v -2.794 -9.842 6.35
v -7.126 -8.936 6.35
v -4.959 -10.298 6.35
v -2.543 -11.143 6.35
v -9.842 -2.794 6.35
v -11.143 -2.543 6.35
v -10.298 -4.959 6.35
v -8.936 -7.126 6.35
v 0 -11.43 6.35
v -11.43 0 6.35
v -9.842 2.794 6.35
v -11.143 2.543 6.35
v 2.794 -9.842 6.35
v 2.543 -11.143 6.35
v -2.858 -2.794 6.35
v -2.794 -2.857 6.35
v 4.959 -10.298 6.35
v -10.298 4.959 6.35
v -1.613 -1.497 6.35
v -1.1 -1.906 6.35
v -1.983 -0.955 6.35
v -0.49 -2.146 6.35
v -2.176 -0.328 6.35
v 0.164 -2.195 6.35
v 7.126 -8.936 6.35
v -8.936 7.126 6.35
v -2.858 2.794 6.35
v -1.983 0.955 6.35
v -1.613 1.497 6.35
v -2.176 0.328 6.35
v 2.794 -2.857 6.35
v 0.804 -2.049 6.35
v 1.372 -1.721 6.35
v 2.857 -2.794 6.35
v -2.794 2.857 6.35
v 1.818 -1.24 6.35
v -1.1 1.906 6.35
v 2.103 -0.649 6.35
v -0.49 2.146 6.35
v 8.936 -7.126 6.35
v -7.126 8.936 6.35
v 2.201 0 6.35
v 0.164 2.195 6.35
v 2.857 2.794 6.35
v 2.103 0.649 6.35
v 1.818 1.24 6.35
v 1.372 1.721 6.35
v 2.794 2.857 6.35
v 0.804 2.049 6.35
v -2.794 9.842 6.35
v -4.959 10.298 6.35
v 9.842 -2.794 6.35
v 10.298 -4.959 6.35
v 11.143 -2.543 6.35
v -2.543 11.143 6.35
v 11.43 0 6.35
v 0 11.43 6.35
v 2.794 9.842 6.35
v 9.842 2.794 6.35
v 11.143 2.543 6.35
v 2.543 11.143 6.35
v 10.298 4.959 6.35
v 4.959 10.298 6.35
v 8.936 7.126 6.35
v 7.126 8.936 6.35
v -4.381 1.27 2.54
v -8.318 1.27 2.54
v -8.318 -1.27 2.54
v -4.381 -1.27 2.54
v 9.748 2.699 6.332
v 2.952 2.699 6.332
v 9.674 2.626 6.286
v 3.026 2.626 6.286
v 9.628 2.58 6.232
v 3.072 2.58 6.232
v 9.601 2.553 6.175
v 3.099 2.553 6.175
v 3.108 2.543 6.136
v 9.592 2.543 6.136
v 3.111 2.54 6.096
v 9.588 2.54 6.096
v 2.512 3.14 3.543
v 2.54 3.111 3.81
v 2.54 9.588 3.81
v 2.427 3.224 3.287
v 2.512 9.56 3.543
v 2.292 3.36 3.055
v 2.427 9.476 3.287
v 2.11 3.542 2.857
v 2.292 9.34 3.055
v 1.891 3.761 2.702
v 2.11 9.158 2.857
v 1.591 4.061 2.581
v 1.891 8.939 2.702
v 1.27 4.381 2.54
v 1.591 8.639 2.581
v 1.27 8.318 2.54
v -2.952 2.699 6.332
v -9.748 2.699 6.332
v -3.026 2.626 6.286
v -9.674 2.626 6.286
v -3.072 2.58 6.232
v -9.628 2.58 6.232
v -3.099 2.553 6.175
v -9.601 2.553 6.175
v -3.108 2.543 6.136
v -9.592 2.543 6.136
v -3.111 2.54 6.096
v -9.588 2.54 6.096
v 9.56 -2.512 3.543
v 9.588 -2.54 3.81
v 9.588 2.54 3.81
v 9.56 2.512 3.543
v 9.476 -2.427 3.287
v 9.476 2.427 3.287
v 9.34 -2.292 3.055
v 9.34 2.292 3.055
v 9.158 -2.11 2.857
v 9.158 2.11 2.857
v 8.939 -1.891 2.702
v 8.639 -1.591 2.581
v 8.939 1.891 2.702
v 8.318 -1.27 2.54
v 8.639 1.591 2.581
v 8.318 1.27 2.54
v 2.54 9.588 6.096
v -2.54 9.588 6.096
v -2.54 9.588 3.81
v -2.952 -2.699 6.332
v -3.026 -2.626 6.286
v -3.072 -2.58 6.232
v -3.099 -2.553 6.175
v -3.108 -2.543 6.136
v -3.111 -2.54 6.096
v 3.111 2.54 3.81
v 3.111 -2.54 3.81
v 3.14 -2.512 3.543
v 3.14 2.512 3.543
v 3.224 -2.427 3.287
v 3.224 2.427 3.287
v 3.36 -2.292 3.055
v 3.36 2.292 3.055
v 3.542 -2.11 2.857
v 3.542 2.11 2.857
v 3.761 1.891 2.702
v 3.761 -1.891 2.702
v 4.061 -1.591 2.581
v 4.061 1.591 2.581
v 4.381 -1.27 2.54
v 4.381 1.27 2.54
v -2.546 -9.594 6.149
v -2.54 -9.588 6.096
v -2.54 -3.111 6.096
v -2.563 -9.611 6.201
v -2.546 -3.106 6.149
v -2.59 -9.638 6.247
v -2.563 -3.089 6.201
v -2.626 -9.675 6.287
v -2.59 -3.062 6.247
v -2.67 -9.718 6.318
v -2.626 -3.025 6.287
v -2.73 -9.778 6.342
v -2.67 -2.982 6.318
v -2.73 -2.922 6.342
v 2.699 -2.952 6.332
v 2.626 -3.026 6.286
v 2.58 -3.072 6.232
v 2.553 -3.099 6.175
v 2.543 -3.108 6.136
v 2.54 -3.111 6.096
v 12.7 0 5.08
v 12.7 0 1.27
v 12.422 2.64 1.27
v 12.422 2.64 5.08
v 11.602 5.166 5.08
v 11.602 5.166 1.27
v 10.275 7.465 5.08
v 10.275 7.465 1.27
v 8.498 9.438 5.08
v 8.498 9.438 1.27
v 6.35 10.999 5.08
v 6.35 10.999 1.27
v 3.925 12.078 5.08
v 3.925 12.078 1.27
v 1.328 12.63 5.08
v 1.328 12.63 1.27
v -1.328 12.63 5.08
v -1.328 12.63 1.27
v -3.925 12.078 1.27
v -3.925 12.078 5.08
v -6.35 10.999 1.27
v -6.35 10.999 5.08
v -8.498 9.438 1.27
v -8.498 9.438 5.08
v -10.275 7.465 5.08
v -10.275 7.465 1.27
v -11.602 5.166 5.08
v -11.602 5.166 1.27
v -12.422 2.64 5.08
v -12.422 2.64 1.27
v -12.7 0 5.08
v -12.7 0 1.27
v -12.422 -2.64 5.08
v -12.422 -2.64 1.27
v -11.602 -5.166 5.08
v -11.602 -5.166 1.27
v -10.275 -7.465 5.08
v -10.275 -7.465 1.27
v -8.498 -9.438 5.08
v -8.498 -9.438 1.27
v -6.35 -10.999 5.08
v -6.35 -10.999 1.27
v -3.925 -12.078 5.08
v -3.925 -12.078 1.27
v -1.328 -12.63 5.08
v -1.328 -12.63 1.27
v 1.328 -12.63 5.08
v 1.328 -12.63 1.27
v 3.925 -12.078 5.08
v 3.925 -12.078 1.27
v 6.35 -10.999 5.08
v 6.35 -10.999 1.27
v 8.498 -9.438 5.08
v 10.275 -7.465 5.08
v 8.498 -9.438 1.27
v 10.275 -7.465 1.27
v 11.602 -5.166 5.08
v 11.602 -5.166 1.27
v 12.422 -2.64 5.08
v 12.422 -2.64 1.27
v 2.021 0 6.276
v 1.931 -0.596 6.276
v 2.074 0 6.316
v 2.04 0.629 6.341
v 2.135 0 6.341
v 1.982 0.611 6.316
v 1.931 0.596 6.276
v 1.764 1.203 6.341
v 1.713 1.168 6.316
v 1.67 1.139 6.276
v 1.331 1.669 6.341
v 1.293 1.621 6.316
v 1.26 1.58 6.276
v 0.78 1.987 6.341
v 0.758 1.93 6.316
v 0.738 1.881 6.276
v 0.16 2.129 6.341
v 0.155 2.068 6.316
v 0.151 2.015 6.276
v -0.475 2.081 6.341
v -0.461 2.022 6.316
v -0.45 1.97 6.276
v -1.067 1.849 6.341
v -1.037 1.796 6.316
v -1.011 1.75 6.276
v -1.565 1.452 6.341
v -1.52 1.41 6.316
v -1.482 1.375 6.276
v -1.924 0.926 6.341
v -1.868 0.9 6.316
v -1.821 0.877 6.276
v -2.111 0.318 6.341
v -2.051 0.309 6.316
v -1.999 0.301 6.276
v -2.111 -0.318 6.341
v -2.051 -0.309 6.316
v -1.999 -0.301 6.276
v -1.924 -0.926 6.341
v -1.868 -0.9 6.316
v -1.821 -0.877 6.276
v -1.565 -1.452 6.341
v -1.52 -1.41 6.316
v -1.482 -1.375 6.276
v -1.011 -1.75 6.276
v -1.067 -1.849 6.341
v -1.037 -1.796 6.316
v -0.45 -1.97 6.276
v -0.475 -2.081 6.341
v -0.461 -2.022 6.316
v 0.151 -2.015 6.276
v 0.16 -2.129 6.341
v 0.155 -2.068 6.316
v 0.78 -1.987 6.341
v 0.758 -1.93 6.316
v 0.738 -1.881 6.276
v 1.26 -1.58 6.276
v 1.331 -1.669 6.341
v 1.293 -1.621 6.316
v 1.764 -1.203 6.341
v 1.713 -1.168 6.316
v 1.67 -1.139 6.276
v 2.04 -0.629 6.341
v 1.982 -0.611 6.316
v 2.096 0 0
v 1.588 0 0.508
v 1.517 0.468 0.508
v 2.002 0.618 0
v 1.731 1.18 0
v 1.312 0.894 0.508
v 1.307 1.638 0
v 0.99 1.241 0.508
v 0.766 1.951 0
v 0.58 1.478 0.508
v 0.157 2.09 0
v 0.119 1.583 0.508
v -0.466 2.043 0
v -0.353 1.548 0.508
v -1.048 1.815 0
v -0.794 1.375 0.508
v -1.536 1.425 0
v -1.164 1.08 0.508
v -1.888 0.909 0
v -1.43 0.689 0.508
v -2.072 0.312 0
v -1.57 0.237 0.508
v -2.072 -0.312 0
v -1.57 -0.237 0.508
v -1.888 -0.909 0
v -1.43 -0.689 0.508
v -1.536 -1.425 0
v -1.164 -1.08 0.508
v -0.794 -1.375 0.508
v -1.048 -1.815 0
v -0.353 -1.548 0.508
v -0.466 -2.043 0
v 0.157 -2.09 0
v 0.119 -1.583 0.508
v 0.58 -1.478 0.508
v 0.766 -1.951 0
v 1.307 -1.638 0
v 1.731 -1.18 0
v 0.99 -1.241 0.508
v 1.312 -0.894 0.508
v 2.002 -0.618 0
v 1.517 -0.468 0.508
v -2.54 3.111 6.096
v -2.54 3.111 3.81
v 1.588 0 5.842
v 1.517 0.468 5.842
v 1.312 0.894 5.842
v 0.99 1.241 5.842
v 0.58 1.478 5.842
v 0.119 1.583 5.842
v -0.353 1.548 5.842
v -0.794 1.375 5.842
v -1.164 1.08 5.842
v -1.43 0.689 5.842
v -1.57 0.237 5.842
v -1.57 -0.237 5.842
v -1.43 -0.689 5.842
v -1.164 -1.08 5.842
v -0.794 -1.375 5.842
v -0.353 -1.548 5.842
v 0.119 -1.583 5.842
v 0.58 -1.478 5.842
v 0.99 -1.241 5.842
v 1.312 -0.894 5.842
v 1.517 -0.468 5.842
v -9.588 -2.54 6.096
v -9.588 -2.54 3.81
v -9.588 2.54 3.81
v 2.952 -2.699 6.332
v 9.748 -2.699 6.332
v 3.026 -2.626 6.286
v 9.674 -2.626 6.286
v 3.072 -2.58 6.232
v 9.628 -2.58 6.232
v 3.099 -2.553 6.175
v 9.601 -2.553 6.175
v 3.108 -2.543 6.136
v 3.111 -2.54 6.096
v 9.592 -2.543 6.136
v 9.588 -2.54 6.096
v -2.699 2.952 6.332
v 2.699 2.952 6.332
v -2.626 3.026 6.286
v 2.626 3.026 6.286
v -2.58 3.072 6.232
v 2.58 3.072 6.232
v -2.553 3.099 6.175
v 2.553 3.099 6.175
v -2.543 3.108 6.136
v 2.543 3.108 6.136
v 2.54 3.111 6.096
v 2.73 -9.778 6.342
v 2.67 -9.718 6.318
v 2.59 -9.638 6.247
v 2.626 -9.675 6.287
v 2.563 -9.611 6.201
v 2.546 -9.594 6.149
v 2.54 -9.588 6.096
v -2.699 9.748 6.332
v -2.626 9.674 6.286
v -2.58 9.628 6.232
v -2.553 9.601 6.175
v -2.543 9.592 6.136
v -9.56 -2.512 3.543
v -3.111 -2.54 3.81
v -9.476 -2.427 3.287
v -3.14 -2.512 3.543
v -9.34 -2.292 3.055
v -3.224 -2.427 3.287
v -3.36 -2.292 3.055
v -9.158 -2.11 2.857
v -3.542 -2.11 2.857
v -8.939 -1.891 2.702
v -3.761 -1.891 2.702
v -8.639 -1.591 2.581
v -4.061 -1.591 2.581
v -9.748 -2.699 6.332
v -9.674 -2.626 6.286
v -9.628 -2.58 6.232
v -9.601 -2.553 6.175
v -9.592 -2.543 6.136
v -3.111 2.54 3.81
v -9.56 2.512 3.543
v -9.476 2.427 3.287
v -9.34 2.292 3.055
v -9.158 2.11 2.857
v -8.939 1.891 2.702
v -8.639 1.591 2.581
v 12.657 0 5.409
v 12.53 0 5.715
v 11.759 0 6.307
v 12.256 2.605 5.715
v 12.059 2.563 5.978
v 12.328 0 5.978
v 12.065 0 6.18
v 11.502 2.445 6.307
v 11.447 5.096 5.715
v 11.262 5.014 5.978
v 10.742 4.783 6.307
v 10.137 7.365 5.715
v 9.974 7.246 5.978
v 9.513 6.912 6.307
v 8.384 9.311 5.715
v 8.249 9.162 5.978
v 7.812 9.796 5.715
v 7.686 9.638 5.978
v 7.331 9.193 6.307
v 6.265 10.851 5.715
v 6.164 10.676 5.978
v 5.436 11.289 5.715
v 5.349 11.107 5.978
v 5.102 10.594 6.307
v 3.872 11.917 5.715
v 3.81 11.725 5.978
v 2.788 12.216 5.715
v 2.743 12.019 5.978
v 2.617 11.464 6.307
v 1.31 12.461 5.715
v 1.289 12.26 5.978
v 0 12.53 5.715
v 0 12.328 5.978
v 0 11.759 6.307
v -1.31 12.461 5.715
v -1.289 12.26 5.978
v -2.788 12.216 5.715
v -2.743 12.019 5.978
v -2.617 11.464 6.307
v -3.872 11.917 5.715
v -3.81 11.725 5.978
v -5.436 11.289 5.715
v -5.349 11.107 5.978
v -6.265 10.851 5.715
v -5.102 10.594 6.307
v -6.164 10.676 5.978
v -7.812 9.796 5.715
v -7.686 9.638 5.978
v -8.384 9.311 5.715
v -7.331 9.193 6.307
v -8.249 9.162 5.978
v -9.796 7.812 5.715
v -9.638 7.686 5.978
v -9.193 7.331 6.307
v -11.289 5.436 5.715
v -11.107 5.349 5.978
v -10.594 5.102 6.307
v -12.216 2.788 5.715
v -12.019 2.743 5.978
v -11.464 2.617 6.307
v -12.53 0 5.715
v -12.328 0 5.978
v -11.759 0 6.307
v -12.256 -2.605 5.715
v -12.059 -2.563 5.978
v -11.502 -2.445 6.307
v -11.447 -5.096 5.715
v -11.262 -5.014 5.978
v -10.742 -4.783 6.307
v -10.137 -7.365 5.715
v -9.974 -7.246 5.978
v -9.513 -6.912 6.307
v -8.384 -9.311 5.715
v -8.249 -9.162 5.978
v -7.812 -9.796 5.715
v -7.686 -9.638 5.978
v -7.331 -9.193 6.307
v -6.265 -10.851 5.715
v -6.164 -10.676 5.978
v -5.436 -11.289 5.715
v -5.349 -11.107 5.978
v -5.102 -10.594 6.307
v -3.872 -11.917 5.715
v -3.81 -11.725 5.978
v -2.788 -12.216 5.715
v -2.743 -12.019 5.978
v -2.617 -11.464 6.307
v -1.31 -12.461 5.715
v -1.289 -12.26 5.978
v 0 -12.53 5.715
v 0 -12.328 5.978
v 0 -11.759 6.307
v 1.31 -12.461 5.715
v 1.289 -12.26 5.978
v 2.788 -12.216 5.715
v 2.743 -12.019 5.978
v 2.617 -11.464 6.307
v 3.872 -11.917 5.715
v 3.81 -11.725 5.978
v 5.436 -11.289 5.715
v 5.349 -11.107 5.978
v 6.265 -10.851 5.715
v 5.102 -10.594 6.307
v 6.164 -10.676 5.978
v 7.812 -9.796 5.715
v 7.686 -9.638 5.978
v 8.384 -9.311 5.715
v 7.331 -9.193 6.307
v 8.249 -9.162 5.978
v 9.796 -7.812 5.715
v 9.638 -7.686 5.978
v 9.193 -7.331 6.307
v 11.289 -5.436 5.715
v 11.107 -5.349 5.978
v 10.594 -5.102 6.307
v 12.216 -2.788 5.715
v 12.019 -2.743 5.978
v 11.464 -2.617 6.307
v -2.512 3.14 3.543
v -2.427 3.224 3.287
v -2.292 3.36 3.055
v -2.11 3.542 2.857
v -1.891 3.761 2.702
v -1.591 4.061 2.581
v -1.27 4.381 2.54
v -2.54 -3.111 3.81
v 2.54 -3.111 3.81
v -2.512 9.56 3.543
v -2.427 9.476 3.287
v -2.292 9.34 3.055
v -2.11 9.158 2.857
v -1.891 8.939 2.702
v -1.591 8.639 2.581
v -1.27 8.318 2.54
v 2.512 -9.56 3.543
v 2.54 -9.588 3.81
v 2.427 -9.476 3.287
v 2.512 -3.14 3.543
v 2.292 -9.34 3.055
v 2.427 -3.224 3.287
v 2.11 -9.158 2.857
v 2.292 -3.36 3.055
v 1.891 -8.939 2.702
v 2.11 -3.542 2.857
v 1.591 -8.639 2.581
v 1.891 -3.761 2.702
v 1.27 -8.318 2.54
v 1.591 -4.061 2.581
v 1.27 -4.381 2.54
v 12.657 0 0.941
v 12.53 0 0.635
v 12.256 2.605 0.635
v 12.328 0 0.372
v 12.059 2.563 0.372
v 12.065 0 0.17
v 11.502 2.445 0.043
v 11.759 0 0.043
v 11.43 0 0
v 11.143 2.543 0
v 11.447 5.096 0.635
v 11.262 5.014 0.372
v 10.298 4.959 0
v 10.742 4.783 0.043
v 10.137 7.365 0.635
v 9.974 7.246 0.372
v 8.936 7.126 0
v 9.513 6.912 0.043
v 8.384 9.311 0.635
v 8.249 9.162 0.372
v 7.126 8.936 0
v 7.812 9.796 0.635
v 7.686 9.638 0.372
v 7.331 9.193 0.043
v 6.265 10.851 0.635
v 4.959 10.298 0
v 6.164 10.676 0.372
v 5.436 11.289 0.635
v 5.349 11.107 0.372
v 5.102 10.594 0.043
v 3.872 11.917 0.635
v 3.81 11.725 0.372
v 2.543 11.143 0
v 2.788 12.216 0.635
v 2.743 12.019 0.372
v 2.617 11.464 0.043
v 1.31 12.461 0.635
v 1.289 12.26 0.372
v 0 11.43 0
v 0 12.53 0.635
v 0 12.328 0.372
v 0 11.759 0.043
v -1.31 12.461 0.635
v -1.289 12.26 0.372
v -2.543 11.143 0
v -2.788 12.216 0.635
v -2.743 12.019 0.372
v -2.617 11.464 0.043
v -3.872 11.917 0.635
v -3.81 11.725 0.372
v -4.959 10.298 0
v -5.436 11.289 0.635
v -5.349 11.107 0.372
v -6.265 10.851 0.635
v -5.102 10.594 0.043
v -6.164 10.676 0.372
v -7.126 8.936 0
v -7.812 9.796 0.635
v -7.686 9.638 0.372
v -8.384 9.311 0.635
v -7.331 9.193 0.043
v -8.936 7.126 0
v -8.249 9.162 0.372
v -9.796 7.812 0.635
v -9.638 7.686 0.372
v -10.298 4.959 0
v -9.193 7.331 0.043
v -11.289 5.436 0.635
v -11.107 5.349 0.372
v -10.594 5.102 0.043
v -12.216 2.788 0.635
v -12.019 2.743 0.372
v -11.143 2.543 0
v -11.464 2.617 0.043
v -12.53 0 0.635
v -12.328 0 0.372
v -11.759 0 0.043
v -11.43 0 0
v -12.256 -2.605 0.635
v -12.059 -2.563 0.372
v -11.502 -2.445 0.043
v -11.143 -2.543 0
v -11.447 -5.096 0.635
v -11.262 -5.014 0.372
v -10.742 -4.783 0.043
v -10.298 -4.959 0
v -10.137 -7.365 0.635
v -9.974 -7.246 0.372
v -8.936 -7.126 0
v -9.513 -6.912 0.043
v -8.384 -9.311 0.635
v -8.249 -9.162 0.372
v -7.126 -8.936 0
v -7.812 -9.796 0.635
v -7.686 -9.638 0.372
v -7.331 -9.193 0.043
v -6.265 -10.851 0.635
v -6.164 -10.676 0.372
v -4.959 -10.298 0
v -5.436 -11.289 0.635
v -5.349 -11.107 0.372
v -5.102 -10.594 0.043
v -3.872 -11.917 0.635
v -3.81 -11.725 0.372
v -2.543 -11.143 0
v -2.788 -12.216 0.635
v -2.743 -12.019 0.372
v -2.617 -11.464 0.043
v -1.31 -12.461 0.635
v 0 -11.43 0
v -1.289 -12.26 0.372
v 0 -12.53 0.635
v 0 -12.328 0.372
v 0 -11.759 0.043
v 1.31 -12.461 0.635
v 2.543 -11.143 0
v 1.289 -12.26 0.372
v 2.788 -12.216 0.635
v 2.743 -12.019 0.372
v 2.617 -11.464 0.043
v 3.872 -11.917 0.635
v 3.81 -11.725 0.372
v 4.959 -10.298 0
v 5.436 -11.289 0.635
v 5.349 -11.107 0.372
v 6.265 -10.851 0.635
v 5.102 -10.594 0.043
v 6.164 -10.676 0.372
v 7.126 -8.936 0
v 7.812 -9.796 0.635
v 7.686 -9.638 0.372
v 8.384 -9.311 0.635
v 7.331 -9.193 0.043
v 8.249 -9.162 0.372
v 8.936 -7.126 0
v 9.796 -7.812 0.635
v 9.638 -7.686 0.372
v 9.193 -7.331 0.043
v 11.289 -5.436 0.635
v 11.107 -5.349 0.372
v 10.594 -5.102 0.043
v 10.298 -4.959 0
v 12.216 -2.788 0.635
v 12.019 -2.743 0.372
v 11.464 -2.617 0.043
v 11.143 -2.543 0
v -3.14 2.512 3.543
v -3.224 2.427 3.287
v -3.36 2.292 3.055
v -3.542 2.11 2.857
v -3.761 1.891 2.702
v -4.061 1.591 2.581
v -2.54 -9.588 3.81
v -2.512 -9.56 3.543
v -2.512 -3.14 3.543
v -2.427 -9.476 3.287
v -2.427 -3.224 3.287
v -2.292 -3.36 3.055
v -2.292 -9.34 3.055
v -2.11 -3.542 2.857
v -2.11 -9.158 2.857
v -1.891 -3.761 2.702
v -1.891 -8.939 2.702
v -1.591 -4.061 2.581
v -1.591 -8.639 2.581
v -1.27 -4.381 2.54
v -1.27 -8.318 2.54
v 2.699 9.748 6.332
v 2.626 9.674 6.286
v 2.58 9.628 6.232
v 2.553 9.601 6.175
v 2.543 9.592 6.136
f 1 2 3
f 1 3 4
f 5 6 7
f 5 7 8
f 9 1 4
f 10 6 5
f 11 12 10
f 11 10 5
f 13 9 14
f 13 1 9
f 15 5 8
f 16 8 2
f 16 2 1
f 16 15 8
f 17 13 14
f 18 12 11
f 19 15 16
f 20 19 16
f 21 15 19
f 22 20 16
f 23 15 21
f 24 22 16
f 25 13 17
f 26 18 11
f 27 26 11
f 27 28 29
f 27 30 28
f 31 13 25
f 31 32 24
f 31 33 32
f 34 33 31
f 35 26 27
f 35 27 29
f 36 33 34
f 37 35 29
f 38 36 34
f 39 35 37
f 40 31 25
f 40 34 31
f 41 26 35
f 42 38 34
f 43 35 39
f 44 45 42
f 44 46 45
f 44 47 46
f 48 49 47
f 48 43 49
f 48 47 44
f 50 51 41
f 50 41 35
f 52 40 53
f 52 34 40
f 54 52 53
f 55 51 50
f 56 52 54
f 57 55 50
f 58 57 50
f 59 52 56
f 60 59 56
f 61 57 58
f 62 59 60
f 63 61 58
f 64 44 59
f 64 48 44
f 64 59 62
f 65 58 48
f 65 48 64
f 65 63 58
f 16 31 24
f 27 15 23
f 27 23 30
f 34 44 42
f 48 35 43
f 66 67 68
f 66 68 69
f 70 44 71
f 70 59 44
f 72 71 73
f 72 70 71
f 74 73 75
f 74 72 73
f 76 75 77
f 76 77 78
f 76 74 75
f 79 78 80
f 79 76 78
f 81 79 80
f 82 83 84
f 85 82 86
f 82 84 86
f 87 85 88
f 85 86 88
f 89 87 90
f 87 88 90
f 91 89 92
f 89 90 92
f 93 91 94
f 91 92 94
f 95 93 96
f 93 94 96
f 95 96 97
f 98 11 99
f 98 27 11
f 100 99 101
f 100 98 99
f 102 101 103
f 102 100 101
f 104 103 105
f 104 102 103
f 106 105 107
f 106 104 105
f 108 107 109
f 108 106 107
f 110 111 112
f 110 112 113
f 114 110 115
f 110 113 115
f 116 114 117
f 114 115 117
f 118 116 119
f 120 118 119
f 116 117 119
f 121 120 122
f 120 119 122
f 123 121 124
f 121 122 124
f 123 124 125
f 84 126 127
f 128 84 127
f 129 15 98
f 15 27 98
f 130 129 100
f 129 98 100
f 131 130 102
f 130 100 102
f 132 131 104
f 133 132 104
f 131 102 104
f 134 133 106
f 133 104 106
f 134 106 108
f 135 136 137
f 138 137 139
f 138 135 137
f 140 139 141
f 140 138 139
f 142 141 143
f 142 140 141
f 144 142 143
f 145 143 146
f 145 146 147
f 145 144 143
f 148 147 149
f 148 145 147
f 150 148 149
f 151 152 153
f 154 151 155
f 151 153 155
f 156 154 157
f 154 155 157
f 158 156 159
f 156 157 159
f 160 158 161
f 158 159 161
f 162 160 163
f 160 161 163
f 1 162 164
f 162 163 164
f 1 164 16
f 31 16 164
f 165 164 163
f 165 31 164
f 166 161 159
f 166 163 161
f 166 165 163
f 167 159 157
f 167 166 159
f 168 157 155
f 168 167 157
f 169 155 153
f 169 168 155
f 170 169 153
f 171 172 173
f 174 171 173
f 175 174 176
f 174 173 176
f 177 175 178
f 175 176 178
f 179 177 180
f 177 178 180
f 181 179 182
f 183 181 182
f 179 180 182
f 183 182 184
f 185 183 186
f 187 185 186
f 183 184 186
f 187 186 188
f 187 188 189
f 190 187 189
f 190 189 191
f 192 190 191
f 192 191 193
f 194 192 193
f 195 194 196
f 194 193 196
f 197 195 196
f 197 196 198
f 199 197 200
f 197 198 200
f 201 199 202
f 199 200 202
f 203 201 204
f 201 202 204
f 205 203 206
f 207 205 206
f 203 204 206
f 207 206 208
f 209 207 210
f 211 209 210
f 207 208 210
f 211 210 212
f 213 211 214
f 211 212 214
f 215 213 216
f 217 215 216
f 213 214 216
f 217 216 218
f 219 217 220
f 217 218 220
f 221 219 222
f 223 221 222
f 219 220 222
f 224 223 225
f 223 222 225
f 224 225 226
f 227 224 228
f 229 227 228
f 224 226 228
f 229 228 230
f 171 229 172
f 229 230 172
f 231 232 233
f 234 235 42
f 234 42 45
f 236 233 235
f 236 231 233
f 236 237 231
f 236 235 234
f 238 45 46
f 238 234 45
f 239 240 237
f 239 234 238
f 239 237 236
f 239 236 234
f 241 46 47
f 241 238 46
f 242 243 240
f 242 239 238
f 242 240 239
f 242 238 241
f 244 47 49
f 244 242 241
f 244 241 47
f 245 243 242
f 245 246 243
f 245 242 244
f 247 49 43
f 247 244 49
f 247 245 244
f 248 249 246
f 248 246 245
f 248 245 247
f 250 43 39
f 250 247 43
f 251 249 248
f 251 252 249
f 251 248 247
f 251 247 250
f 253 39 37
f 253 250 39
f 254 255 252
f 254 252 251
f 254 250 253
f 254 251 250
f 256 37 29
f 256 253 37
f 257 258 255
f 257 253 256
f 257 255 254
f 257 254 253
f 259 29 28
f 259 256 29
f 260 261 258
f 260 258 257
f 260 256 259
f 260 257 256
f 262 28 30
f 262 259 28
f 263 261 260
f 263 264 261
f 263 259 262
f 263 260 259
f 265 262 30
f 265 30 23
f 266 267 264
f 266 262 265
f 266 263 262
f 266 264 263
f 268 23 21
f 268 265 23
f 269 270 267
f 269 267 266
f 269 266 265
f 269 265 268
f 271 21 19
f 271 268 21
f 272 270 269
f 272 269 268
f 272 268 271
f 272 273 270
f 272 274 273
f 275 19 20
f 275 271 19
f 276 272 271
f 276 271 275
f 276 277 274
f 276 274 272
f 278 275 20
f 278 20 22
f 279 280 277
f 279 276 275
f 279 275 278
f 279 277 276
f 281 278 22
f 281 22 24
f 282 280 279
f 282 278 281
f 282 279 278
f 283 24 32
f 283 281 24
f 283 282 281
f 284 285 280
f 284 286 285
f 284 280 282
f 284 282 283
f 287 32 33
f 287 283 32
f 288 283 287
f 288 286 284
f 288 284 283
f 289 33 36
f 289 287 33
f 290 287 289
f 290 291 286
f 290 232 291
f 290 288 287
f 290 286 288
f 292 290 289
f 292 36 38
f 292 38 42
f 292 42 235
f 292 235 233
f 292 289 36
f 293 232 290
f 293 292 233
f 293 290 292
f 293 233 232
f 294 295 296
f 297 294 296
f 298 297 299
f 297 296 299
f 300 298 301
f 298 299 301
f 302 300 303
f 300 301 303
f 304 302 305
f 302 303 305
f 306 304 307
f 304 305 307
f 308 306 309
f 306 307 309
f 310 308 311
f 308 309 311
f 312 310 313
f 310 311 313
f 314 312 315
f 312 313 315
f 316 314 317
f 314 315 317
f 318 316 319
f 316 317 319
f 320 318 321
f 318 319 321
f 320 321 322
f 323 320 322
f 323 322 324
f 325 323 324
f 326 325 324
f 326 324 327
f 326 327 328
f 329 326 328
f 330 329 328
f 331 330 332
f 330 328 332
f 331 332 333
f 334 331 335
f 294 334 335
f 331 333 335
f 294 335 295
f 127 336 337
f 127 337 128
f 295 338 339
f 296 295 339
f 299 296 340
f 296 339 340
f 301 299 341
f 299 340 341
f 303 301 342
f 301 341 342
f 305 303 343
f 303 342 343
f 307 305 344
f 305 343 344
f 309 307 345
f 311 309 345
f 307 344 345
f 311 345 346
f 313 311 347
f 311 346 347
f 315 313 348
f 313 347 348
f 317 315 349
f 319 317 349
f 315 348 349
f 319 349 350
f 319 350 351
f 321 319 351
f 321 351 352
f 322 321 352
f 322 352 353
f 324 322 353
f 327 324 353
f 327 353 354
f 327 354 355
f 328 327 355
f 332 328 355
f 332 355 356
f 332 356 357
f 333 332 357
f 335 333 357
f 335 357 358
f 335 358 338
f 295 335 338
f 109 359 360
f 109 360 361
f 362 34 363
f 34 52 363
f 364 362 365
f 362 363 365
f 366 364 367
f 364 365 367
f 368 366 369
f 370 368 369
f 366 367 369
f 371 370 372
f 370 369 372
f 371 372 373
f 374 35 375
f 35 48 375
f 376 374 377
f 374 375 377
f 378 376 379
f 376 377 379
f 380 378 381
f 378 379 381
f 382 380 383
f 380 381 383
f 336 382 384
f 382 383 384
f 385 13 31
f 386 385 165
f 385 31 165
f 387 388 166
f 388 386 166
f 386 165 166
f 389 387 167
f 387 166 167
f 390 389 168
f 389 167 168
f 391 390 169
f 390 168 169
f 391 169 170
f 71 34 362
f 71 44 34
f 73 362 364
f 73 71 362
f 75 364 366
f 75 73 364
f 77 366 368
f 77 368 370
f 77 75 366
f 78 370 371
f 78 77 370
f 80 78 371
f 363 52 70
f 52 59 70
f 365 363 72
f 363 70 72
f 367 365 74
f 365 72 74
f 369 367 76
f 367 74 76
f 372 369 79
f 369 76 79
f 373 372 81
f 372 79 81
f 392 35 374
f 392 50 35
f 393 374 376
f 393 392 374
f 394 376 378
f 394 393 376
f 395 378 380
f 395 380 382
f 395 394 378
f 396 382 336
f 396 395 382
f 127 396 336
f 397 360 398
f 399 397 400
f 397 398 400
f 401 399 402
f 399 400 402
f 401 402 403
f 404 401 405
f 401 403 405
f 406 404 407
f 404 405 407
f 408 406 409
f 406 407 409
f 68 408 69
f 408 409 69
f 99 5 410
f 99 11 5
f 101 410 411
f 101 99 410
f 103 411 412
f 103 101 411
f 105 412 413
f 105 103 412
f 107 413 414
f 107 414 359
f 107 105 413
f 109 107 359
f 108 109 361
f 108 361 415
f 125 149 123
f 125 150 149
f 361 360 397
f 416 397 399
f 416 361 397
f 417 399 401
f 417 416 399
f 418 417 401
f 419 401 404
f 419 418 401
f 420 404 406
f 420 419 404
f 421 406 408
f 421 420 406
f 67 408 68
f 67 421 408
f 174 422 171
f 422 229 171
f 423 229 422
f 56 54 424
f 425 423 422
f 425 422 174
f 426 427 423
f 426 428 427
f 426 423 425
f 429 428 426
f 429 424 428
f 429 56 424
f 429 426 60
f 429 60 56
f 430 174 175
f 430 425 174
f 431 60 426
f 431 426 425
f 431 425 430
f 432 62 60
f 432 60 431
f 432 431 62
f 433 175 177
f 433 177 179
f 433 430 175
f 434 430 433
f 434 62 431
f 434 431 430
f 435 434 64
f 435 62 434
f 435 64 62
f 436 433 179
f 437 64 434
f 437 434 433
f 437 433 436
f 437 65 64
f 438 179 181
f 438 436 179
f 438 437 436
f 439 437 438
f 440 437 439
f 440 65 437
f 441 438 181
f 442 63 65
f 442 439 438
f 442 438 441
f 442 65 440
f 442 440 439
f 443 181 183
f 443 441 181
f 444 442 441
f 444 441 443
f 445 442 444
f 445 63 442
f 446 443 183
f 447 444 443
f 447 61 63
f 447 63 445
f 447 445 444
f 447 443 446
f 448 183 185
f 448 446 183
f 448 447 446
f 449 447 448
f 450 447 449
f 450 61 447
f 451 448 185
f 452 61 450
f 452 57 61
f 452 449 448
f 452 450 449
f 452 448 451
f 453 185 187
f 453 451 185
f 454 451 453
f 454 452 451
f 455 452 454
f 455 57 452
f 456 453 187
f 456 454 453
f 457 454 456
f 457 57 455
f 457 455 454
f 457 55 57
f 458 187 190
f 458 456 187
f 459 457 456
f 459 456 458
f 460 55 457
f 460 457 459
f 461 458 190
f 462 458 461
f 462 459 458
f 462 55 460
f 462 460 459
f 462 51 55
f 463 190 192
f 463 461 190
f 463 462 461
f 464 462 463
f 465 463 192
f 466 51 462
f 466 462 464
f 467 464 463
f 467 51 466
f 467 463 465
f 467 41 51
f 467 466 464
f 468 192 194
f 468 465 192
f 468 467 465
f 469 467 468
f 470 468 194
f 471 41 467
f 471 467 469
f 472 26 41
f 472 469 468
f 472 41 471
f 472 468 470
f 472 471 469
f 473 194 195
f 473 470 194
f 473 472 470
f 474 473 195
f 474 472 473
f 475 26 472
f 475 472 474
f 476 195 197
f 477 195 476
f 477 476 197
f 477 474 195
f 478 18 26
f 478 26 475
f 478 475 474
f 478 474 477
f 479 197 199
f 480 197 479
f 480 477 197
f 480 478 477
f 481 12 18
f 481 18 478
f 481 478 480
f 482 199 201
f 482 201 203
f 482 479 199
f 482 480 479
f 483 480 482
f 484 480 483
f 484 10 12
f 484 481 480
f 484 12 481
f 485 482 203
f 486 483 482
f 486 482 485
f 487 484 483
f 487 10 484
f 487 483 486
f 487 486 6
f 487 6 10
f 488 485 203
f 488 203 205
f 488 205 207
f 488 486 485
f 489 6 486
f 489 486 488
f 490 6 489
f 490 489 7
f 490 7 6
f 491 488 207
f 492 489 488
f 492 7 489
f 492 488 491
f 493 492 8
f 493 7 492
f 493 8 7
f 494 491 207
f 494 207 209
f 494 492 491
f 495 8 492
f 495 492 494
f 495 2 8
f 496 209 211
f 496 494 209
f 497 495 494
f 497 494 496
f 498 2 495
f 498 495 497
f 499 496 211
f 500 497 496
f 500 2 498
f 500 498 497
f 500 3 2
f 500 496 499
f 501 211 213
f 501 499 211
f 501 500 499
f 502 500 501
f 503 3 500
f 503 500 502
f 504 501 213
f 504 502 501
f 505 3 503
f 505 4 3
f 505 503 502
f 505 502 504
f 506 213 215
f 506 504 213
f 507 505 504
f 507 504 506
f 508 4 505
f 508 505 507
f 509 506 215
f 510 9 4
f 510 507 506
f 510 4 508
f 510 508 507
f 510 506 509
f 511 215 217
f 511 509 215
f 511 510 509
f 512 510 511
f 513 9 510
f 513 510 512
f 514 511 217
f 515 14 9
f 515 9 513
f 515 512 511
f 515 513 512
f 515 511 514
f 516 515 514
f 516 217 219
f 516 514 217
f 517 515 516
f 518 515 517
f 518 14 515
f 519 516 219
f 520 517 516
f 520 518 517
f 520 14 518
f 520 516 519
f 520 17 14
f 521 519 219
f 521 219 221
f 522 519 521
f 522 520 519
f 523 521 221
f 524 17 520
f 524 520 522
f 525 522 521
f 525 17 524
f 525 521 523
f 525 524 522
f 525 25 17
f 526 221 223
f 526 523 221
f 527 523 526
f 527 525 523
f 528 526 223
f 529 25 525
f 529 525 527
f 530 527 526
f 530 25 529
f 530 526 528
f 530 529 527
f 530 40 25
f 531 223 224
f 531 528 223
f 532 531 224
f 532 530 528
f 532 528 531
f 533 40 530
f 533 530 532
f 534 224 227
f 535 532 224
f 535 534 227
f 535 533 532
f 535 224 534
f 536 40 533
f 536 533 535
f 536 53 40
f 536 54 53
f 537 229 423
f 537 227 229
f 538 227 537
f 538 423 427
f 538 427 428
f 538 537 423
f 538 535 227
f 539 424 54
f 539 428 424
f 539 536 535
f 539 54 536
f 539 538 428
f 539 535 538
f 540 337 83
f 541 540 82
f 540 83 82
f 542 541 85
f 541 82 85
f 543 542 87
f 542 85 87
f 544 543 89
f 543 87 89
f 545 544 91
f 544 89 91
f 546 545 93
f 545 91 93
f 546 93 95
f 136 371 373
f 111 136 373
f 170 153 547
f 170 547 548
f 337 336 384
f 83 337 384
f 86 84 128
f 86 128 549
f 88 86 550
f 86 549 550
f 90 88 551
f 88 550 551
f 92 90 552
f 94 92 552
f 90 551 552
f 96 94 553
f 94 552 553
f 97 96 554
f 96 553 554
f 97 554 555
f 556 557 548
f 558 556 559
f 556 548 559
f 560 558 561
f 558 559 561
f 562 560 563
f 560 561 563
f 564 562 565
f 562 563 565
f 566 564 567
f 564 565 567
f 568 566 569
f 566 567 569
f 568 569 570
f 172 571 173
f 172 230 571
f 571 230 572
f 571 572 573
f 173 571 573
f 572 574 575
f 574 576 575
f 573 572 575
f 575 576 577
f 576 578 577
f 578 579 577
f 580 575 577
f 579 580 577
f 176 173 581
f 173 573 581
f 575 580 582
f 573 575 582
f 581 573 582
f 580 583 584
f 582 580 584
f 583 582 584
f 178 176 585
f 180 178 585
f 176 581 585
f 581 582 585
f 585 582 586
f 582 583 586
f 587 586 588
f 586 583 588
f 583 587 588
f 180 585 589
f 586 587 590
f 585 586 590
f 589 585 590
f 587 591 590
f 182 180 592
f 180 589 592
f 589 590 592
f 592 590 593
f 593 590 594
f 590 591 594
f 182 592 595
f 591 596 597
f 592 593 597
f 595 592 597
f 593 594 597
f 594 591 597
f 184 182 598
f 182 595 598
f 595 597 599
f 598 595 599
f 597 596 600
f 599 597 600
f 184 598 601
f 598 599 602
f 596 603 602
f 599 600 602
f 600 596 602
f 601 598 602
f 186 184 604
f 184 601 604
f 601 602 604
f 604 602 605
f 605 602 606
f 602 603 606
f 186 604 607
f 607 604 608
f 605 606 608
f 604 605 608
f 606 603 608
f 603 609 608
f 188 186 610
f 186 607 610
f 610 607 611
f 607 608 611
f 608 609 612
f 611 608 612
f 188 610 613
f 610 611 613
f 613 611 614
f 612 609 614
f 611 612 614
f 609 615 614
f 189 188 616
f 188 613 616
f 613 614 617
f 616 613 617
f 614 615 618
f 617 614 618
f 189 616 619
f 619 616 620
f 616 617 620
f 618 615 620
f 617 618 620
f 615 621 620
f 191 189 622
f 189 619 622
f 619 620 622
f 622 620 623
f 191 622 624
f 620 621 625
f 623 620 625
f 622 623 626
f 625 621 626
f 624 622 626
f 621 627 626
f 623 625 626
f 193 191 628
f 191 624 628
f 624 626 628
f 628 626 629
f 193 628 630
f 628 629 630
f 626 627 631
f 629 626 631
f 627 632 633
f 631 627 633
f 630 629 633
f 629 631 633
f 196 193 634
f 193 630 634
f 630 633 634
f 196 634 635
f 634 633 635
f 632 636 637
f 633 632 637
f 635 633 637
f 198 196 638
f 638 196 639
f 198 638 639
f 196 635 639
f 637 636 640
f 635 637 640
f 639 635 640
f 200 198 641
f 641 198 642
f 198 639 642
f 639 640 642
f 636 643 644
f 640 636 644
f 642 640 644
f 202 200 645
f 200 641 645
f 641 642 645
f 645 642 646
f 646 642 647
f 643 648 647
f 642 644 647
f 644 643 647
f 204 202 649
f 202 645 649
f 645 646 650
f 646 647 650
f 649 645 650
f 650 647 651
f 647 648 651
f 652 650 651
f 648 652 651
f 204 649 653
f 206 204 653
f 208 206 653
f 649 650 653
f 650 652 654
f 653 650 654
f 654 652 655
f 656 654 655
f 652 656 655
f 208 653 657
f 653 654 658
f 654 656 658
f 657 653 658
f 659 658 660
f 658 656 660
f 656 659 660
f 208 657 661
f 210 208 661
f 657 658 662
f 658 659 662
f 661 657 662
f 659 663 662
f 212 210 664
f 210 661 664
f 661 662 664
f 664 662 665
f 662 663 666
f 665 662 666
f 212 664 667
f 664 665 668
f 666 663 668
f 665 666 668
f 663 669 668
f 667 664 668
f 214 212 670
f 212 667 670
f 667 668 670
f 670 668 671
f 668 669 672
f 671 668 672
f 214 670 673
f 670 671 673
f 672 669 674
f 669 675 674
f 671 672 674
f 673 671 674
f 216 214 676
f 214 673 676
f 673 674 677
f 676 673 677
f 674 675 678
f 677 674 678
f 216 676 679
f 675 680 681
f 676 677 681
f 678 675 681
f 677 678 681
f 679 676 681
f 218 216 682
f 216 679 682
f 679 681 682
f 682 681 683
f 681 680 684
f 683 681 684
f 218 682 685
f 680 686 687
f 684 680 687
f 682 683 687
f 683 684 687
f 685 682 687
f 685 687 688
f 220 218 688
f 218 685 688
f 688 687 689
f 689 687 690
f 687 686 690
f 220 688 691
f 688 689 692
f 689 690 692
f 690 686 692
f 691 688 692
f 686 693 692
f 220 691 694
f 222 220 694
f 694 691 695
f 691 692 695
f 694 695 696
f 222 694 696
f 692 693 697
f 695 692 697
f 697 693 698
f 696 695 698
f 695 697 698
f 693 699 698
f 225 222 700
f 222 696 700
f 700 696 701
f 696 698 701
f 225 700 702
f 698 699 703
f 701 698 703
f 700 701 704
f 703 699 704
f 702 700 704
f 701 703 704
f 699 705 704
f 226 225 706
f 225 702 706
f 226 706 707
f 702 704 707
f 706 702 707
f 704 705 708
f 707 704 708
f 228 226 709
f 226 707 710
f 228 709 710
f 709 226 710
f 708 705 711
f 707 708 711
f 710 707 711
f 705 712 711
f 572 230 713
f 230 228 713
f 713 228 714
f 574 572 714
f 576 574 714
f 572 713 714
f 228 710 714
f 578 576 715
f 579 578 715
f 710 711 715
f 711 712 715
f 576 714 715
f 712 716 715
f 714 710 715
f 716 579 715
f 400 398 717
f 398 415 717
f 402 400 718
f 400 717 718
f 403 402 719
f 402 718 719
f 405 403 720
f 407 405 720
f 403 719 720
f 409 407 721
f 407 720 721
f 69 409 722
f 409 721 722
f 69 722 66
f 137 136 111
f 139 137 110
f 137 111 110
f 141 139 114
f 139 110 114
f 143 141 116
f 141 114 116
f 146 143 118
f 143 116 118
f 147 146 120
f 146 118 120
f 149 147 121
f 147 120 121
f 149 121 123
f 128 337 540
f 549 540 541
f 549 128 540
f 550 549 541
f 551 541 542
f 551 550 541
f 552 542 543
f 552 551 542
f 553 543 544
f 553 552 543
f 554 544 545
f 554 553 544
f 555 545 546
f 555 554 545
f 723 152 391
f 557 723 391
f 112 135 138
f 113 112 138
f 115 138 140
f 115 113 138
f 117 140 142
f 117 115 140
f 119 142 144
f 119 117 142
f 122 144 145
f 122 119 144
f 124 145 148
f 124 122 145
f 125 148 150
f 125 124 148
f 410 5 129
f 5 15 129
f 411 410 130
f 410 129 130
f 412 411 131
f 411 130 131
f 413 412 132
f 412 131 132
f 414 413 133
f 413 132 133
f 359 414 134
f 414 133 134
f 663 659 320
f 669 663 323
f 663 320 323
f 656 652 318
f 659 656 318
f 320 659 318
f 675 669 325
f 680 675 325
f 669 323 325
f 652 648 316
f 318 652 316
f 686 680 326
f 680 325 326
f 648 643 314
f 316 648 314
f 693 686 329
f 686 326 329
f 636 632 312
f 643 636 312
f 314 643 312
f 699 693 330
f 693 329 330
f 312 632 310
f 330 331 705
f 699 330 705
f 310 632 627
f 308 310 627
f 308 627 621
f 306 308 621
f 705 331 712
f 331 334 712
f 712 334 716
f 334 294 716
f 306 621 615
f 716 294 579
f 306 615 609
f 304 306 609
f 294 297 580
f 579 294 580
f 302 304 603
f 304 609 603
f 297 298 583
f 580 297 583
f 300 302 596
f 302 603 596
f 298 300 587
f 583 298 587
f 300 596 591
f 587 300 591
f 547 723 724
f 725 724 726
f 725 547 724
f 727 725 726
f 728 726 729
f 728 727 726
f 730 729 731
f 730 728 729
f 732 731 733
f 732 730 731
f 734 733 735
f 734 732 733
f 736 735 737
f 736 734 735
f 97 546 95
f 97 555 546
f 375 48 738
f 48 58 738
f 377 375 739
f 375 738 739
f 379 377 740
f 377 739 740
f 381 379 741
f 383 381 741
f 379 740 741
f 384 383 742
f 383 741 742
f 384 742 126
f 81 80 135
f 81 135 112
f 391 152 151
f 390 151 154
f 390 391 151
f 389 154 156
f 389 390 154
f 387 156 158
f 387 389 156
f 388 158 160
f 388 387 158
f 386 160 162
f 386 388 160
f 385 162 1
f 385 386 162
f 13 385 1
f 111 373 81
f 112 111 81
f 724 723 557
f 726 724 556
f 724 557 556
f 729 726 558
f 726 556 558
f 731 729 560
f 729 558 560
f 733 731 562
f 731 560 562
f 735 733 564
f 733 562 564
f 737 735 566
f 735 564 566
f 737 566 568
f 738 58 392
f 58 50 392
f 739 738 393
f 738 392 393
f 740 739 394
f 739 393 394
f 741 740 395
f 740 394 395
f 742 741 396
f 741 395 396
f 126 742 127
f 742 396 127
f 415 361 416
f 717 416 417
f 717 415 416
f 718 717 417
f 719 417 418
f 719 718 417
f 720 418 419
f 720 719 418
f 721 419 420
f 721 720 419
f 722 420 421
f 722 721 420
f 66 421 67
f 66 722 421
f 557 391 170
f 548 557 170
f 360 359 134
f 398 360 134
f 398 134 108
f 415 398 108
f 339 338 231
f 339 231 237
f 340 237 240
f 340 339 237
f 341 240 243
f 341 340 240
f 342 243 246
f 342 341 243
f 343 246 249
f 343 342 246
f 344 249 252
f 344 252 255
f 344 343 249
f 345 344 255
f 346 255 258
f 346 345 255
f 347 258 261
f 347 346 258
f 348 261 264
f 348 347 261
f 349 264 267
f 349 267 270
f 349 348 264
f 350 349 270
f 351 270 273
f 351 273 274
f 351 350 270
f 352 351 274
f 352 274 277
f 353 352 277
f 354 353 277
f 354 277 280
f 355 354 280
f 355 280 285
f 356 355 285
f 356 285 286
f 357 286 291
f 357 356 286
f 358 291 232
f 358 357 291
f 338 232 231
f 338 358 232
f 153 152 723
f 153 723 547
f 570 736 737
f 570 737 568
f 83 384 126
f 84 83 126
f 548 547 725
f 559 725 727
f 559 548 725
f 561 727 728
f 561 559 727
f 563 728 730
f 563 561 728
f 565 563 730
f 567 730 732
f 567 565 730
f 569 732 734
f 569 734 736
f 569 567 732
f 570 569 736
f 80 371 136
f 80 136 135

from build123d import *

# Parameters (mm, degrees)
F0_R     = 12.7
F1_DEPTH = 6.35
F2_R     = 1.5875
F3_DEPTH = 25.4
F4_R     = 1.27
F5_SIZE  = 0.508
F6_W     = 2.54
F6_H     = 6.477
F6_W_2   = 6.477
F6_H_2   = 5.08
F6_W_3   = 5.08
F7_DEPTH = 3.81
F8_R     = 1.27
F9_R     = 0.254


with BuildPart() as f1:
    # F0 (on Top) → F1 (new body)
    with BuildSketch(Plane.XY):
        Circle(F0_R)
    extrude(amount=F1_DEPTH)

    # F2 (on face) → F3 (cut)
    with BuildSketch(Plane.XY.offset(6.35)):
        Circle(F2_R)
    extrude(amount=-F3_DEPTH, mode=Mode.SUBTRACT)

    # F4
    f4_edges = [f1.edges().sort_by_distance(p)[0] for p in [
        (12.7, 0, 3.175),
        (-12.7, 0, 0),
        (-12.7, 0, 6.35),
    ]]
    fillet(f4_edges, radius=F4_R)

    # F5
    f5_edges = [f1.edges().sort_by_distance(p)[0] for p in [
        (-1.5875, 0, 6.35),
        (-1.5875, 0, 0),
    ]]
    chamfer(f5_edges, length=F5_SIZE)

    # F6 (on face) → F7 (cut)
    with BuildSketch(Plane.XY.offset(6.35)):
        with Locations((-1.27, 6.35)):
            Rectangle(F6_W, F6_H)
        with Locations((1.27, 6.35)):
            Rectangle(F6_W, F6_H)
        with Locations((-6.35, 0)):
            Rectangle(F6_W_2, F6_H_2)
        with Locations((0, -6.35)):
            Rectangle(F6_W_3, F6_H)
        with Locations((6.35, 0)):
            Rectangle(F6_W_2, F6_H_2)
    extrude(amount=-F7_DEPTH, mode=Mode.SUBTRACT)

    # F8
    f8_edges = [f1.edges().sort_by_distance(p)[0] for p in [
        (-2.54, -6.35, 2.54),
        (0, -9.5885, 2.54),
        (2.54, -6.35, 2.54),
        (0, -3.1115, 2.54),
        (6.35, -2.54, 2.54),
        (9.5885, 0, 2.54),
        (6.35, 2.54, 2.54),
        (3.1115, 0, 2.54),
        (-6.35, 2.54, 2.54),
        (-9.5885, 0, 2.54),
        (-6.35, -2.54, 2.54),
        (-3.1115, 0, 2.54),
        (0, 3.1115, 2.54),
        (2.54, 6.35, 2.54),
        (0, 9.5885, 2.54),
        (-2.54, 6.35, 2.54),
    ]]
    fillet(f8_edges, radius=F8_R)

    # F9
    f9_edges = [f1.edges().sort_by_distance(p)[0] for p in [
        (-11.43, 0, 6.35),
        (-2.54, -6.35, 6.35),
        (0, -9.5885, 6.35),
        (2.54, -6.35, 6.35),
        (0, -3.1115, 6.35),
        (-6.35, 2.54, 6.35),
        (-9.5885, 0, 6.35),
        (-6.35, -2.54, 6.35),
        (-3.1115, 0, 6.35),
        (-2.0955, 0, 6.35),
        (6.35, -2.54, 6.35),
        (9.5885, 0, 6.35),
        (6.35, 2.54, 6.35),
        (3.1115, 0, 6.35),
        (0, 3.1115, 6.35),
        (2.54, 6.35, 6.35),
        (0, 9.5885, 6.35),
        (-2.54, 6.35, 6.35),
    ]]
    fillet(f9_edges, radius=F9_R)


solid = f1.part
